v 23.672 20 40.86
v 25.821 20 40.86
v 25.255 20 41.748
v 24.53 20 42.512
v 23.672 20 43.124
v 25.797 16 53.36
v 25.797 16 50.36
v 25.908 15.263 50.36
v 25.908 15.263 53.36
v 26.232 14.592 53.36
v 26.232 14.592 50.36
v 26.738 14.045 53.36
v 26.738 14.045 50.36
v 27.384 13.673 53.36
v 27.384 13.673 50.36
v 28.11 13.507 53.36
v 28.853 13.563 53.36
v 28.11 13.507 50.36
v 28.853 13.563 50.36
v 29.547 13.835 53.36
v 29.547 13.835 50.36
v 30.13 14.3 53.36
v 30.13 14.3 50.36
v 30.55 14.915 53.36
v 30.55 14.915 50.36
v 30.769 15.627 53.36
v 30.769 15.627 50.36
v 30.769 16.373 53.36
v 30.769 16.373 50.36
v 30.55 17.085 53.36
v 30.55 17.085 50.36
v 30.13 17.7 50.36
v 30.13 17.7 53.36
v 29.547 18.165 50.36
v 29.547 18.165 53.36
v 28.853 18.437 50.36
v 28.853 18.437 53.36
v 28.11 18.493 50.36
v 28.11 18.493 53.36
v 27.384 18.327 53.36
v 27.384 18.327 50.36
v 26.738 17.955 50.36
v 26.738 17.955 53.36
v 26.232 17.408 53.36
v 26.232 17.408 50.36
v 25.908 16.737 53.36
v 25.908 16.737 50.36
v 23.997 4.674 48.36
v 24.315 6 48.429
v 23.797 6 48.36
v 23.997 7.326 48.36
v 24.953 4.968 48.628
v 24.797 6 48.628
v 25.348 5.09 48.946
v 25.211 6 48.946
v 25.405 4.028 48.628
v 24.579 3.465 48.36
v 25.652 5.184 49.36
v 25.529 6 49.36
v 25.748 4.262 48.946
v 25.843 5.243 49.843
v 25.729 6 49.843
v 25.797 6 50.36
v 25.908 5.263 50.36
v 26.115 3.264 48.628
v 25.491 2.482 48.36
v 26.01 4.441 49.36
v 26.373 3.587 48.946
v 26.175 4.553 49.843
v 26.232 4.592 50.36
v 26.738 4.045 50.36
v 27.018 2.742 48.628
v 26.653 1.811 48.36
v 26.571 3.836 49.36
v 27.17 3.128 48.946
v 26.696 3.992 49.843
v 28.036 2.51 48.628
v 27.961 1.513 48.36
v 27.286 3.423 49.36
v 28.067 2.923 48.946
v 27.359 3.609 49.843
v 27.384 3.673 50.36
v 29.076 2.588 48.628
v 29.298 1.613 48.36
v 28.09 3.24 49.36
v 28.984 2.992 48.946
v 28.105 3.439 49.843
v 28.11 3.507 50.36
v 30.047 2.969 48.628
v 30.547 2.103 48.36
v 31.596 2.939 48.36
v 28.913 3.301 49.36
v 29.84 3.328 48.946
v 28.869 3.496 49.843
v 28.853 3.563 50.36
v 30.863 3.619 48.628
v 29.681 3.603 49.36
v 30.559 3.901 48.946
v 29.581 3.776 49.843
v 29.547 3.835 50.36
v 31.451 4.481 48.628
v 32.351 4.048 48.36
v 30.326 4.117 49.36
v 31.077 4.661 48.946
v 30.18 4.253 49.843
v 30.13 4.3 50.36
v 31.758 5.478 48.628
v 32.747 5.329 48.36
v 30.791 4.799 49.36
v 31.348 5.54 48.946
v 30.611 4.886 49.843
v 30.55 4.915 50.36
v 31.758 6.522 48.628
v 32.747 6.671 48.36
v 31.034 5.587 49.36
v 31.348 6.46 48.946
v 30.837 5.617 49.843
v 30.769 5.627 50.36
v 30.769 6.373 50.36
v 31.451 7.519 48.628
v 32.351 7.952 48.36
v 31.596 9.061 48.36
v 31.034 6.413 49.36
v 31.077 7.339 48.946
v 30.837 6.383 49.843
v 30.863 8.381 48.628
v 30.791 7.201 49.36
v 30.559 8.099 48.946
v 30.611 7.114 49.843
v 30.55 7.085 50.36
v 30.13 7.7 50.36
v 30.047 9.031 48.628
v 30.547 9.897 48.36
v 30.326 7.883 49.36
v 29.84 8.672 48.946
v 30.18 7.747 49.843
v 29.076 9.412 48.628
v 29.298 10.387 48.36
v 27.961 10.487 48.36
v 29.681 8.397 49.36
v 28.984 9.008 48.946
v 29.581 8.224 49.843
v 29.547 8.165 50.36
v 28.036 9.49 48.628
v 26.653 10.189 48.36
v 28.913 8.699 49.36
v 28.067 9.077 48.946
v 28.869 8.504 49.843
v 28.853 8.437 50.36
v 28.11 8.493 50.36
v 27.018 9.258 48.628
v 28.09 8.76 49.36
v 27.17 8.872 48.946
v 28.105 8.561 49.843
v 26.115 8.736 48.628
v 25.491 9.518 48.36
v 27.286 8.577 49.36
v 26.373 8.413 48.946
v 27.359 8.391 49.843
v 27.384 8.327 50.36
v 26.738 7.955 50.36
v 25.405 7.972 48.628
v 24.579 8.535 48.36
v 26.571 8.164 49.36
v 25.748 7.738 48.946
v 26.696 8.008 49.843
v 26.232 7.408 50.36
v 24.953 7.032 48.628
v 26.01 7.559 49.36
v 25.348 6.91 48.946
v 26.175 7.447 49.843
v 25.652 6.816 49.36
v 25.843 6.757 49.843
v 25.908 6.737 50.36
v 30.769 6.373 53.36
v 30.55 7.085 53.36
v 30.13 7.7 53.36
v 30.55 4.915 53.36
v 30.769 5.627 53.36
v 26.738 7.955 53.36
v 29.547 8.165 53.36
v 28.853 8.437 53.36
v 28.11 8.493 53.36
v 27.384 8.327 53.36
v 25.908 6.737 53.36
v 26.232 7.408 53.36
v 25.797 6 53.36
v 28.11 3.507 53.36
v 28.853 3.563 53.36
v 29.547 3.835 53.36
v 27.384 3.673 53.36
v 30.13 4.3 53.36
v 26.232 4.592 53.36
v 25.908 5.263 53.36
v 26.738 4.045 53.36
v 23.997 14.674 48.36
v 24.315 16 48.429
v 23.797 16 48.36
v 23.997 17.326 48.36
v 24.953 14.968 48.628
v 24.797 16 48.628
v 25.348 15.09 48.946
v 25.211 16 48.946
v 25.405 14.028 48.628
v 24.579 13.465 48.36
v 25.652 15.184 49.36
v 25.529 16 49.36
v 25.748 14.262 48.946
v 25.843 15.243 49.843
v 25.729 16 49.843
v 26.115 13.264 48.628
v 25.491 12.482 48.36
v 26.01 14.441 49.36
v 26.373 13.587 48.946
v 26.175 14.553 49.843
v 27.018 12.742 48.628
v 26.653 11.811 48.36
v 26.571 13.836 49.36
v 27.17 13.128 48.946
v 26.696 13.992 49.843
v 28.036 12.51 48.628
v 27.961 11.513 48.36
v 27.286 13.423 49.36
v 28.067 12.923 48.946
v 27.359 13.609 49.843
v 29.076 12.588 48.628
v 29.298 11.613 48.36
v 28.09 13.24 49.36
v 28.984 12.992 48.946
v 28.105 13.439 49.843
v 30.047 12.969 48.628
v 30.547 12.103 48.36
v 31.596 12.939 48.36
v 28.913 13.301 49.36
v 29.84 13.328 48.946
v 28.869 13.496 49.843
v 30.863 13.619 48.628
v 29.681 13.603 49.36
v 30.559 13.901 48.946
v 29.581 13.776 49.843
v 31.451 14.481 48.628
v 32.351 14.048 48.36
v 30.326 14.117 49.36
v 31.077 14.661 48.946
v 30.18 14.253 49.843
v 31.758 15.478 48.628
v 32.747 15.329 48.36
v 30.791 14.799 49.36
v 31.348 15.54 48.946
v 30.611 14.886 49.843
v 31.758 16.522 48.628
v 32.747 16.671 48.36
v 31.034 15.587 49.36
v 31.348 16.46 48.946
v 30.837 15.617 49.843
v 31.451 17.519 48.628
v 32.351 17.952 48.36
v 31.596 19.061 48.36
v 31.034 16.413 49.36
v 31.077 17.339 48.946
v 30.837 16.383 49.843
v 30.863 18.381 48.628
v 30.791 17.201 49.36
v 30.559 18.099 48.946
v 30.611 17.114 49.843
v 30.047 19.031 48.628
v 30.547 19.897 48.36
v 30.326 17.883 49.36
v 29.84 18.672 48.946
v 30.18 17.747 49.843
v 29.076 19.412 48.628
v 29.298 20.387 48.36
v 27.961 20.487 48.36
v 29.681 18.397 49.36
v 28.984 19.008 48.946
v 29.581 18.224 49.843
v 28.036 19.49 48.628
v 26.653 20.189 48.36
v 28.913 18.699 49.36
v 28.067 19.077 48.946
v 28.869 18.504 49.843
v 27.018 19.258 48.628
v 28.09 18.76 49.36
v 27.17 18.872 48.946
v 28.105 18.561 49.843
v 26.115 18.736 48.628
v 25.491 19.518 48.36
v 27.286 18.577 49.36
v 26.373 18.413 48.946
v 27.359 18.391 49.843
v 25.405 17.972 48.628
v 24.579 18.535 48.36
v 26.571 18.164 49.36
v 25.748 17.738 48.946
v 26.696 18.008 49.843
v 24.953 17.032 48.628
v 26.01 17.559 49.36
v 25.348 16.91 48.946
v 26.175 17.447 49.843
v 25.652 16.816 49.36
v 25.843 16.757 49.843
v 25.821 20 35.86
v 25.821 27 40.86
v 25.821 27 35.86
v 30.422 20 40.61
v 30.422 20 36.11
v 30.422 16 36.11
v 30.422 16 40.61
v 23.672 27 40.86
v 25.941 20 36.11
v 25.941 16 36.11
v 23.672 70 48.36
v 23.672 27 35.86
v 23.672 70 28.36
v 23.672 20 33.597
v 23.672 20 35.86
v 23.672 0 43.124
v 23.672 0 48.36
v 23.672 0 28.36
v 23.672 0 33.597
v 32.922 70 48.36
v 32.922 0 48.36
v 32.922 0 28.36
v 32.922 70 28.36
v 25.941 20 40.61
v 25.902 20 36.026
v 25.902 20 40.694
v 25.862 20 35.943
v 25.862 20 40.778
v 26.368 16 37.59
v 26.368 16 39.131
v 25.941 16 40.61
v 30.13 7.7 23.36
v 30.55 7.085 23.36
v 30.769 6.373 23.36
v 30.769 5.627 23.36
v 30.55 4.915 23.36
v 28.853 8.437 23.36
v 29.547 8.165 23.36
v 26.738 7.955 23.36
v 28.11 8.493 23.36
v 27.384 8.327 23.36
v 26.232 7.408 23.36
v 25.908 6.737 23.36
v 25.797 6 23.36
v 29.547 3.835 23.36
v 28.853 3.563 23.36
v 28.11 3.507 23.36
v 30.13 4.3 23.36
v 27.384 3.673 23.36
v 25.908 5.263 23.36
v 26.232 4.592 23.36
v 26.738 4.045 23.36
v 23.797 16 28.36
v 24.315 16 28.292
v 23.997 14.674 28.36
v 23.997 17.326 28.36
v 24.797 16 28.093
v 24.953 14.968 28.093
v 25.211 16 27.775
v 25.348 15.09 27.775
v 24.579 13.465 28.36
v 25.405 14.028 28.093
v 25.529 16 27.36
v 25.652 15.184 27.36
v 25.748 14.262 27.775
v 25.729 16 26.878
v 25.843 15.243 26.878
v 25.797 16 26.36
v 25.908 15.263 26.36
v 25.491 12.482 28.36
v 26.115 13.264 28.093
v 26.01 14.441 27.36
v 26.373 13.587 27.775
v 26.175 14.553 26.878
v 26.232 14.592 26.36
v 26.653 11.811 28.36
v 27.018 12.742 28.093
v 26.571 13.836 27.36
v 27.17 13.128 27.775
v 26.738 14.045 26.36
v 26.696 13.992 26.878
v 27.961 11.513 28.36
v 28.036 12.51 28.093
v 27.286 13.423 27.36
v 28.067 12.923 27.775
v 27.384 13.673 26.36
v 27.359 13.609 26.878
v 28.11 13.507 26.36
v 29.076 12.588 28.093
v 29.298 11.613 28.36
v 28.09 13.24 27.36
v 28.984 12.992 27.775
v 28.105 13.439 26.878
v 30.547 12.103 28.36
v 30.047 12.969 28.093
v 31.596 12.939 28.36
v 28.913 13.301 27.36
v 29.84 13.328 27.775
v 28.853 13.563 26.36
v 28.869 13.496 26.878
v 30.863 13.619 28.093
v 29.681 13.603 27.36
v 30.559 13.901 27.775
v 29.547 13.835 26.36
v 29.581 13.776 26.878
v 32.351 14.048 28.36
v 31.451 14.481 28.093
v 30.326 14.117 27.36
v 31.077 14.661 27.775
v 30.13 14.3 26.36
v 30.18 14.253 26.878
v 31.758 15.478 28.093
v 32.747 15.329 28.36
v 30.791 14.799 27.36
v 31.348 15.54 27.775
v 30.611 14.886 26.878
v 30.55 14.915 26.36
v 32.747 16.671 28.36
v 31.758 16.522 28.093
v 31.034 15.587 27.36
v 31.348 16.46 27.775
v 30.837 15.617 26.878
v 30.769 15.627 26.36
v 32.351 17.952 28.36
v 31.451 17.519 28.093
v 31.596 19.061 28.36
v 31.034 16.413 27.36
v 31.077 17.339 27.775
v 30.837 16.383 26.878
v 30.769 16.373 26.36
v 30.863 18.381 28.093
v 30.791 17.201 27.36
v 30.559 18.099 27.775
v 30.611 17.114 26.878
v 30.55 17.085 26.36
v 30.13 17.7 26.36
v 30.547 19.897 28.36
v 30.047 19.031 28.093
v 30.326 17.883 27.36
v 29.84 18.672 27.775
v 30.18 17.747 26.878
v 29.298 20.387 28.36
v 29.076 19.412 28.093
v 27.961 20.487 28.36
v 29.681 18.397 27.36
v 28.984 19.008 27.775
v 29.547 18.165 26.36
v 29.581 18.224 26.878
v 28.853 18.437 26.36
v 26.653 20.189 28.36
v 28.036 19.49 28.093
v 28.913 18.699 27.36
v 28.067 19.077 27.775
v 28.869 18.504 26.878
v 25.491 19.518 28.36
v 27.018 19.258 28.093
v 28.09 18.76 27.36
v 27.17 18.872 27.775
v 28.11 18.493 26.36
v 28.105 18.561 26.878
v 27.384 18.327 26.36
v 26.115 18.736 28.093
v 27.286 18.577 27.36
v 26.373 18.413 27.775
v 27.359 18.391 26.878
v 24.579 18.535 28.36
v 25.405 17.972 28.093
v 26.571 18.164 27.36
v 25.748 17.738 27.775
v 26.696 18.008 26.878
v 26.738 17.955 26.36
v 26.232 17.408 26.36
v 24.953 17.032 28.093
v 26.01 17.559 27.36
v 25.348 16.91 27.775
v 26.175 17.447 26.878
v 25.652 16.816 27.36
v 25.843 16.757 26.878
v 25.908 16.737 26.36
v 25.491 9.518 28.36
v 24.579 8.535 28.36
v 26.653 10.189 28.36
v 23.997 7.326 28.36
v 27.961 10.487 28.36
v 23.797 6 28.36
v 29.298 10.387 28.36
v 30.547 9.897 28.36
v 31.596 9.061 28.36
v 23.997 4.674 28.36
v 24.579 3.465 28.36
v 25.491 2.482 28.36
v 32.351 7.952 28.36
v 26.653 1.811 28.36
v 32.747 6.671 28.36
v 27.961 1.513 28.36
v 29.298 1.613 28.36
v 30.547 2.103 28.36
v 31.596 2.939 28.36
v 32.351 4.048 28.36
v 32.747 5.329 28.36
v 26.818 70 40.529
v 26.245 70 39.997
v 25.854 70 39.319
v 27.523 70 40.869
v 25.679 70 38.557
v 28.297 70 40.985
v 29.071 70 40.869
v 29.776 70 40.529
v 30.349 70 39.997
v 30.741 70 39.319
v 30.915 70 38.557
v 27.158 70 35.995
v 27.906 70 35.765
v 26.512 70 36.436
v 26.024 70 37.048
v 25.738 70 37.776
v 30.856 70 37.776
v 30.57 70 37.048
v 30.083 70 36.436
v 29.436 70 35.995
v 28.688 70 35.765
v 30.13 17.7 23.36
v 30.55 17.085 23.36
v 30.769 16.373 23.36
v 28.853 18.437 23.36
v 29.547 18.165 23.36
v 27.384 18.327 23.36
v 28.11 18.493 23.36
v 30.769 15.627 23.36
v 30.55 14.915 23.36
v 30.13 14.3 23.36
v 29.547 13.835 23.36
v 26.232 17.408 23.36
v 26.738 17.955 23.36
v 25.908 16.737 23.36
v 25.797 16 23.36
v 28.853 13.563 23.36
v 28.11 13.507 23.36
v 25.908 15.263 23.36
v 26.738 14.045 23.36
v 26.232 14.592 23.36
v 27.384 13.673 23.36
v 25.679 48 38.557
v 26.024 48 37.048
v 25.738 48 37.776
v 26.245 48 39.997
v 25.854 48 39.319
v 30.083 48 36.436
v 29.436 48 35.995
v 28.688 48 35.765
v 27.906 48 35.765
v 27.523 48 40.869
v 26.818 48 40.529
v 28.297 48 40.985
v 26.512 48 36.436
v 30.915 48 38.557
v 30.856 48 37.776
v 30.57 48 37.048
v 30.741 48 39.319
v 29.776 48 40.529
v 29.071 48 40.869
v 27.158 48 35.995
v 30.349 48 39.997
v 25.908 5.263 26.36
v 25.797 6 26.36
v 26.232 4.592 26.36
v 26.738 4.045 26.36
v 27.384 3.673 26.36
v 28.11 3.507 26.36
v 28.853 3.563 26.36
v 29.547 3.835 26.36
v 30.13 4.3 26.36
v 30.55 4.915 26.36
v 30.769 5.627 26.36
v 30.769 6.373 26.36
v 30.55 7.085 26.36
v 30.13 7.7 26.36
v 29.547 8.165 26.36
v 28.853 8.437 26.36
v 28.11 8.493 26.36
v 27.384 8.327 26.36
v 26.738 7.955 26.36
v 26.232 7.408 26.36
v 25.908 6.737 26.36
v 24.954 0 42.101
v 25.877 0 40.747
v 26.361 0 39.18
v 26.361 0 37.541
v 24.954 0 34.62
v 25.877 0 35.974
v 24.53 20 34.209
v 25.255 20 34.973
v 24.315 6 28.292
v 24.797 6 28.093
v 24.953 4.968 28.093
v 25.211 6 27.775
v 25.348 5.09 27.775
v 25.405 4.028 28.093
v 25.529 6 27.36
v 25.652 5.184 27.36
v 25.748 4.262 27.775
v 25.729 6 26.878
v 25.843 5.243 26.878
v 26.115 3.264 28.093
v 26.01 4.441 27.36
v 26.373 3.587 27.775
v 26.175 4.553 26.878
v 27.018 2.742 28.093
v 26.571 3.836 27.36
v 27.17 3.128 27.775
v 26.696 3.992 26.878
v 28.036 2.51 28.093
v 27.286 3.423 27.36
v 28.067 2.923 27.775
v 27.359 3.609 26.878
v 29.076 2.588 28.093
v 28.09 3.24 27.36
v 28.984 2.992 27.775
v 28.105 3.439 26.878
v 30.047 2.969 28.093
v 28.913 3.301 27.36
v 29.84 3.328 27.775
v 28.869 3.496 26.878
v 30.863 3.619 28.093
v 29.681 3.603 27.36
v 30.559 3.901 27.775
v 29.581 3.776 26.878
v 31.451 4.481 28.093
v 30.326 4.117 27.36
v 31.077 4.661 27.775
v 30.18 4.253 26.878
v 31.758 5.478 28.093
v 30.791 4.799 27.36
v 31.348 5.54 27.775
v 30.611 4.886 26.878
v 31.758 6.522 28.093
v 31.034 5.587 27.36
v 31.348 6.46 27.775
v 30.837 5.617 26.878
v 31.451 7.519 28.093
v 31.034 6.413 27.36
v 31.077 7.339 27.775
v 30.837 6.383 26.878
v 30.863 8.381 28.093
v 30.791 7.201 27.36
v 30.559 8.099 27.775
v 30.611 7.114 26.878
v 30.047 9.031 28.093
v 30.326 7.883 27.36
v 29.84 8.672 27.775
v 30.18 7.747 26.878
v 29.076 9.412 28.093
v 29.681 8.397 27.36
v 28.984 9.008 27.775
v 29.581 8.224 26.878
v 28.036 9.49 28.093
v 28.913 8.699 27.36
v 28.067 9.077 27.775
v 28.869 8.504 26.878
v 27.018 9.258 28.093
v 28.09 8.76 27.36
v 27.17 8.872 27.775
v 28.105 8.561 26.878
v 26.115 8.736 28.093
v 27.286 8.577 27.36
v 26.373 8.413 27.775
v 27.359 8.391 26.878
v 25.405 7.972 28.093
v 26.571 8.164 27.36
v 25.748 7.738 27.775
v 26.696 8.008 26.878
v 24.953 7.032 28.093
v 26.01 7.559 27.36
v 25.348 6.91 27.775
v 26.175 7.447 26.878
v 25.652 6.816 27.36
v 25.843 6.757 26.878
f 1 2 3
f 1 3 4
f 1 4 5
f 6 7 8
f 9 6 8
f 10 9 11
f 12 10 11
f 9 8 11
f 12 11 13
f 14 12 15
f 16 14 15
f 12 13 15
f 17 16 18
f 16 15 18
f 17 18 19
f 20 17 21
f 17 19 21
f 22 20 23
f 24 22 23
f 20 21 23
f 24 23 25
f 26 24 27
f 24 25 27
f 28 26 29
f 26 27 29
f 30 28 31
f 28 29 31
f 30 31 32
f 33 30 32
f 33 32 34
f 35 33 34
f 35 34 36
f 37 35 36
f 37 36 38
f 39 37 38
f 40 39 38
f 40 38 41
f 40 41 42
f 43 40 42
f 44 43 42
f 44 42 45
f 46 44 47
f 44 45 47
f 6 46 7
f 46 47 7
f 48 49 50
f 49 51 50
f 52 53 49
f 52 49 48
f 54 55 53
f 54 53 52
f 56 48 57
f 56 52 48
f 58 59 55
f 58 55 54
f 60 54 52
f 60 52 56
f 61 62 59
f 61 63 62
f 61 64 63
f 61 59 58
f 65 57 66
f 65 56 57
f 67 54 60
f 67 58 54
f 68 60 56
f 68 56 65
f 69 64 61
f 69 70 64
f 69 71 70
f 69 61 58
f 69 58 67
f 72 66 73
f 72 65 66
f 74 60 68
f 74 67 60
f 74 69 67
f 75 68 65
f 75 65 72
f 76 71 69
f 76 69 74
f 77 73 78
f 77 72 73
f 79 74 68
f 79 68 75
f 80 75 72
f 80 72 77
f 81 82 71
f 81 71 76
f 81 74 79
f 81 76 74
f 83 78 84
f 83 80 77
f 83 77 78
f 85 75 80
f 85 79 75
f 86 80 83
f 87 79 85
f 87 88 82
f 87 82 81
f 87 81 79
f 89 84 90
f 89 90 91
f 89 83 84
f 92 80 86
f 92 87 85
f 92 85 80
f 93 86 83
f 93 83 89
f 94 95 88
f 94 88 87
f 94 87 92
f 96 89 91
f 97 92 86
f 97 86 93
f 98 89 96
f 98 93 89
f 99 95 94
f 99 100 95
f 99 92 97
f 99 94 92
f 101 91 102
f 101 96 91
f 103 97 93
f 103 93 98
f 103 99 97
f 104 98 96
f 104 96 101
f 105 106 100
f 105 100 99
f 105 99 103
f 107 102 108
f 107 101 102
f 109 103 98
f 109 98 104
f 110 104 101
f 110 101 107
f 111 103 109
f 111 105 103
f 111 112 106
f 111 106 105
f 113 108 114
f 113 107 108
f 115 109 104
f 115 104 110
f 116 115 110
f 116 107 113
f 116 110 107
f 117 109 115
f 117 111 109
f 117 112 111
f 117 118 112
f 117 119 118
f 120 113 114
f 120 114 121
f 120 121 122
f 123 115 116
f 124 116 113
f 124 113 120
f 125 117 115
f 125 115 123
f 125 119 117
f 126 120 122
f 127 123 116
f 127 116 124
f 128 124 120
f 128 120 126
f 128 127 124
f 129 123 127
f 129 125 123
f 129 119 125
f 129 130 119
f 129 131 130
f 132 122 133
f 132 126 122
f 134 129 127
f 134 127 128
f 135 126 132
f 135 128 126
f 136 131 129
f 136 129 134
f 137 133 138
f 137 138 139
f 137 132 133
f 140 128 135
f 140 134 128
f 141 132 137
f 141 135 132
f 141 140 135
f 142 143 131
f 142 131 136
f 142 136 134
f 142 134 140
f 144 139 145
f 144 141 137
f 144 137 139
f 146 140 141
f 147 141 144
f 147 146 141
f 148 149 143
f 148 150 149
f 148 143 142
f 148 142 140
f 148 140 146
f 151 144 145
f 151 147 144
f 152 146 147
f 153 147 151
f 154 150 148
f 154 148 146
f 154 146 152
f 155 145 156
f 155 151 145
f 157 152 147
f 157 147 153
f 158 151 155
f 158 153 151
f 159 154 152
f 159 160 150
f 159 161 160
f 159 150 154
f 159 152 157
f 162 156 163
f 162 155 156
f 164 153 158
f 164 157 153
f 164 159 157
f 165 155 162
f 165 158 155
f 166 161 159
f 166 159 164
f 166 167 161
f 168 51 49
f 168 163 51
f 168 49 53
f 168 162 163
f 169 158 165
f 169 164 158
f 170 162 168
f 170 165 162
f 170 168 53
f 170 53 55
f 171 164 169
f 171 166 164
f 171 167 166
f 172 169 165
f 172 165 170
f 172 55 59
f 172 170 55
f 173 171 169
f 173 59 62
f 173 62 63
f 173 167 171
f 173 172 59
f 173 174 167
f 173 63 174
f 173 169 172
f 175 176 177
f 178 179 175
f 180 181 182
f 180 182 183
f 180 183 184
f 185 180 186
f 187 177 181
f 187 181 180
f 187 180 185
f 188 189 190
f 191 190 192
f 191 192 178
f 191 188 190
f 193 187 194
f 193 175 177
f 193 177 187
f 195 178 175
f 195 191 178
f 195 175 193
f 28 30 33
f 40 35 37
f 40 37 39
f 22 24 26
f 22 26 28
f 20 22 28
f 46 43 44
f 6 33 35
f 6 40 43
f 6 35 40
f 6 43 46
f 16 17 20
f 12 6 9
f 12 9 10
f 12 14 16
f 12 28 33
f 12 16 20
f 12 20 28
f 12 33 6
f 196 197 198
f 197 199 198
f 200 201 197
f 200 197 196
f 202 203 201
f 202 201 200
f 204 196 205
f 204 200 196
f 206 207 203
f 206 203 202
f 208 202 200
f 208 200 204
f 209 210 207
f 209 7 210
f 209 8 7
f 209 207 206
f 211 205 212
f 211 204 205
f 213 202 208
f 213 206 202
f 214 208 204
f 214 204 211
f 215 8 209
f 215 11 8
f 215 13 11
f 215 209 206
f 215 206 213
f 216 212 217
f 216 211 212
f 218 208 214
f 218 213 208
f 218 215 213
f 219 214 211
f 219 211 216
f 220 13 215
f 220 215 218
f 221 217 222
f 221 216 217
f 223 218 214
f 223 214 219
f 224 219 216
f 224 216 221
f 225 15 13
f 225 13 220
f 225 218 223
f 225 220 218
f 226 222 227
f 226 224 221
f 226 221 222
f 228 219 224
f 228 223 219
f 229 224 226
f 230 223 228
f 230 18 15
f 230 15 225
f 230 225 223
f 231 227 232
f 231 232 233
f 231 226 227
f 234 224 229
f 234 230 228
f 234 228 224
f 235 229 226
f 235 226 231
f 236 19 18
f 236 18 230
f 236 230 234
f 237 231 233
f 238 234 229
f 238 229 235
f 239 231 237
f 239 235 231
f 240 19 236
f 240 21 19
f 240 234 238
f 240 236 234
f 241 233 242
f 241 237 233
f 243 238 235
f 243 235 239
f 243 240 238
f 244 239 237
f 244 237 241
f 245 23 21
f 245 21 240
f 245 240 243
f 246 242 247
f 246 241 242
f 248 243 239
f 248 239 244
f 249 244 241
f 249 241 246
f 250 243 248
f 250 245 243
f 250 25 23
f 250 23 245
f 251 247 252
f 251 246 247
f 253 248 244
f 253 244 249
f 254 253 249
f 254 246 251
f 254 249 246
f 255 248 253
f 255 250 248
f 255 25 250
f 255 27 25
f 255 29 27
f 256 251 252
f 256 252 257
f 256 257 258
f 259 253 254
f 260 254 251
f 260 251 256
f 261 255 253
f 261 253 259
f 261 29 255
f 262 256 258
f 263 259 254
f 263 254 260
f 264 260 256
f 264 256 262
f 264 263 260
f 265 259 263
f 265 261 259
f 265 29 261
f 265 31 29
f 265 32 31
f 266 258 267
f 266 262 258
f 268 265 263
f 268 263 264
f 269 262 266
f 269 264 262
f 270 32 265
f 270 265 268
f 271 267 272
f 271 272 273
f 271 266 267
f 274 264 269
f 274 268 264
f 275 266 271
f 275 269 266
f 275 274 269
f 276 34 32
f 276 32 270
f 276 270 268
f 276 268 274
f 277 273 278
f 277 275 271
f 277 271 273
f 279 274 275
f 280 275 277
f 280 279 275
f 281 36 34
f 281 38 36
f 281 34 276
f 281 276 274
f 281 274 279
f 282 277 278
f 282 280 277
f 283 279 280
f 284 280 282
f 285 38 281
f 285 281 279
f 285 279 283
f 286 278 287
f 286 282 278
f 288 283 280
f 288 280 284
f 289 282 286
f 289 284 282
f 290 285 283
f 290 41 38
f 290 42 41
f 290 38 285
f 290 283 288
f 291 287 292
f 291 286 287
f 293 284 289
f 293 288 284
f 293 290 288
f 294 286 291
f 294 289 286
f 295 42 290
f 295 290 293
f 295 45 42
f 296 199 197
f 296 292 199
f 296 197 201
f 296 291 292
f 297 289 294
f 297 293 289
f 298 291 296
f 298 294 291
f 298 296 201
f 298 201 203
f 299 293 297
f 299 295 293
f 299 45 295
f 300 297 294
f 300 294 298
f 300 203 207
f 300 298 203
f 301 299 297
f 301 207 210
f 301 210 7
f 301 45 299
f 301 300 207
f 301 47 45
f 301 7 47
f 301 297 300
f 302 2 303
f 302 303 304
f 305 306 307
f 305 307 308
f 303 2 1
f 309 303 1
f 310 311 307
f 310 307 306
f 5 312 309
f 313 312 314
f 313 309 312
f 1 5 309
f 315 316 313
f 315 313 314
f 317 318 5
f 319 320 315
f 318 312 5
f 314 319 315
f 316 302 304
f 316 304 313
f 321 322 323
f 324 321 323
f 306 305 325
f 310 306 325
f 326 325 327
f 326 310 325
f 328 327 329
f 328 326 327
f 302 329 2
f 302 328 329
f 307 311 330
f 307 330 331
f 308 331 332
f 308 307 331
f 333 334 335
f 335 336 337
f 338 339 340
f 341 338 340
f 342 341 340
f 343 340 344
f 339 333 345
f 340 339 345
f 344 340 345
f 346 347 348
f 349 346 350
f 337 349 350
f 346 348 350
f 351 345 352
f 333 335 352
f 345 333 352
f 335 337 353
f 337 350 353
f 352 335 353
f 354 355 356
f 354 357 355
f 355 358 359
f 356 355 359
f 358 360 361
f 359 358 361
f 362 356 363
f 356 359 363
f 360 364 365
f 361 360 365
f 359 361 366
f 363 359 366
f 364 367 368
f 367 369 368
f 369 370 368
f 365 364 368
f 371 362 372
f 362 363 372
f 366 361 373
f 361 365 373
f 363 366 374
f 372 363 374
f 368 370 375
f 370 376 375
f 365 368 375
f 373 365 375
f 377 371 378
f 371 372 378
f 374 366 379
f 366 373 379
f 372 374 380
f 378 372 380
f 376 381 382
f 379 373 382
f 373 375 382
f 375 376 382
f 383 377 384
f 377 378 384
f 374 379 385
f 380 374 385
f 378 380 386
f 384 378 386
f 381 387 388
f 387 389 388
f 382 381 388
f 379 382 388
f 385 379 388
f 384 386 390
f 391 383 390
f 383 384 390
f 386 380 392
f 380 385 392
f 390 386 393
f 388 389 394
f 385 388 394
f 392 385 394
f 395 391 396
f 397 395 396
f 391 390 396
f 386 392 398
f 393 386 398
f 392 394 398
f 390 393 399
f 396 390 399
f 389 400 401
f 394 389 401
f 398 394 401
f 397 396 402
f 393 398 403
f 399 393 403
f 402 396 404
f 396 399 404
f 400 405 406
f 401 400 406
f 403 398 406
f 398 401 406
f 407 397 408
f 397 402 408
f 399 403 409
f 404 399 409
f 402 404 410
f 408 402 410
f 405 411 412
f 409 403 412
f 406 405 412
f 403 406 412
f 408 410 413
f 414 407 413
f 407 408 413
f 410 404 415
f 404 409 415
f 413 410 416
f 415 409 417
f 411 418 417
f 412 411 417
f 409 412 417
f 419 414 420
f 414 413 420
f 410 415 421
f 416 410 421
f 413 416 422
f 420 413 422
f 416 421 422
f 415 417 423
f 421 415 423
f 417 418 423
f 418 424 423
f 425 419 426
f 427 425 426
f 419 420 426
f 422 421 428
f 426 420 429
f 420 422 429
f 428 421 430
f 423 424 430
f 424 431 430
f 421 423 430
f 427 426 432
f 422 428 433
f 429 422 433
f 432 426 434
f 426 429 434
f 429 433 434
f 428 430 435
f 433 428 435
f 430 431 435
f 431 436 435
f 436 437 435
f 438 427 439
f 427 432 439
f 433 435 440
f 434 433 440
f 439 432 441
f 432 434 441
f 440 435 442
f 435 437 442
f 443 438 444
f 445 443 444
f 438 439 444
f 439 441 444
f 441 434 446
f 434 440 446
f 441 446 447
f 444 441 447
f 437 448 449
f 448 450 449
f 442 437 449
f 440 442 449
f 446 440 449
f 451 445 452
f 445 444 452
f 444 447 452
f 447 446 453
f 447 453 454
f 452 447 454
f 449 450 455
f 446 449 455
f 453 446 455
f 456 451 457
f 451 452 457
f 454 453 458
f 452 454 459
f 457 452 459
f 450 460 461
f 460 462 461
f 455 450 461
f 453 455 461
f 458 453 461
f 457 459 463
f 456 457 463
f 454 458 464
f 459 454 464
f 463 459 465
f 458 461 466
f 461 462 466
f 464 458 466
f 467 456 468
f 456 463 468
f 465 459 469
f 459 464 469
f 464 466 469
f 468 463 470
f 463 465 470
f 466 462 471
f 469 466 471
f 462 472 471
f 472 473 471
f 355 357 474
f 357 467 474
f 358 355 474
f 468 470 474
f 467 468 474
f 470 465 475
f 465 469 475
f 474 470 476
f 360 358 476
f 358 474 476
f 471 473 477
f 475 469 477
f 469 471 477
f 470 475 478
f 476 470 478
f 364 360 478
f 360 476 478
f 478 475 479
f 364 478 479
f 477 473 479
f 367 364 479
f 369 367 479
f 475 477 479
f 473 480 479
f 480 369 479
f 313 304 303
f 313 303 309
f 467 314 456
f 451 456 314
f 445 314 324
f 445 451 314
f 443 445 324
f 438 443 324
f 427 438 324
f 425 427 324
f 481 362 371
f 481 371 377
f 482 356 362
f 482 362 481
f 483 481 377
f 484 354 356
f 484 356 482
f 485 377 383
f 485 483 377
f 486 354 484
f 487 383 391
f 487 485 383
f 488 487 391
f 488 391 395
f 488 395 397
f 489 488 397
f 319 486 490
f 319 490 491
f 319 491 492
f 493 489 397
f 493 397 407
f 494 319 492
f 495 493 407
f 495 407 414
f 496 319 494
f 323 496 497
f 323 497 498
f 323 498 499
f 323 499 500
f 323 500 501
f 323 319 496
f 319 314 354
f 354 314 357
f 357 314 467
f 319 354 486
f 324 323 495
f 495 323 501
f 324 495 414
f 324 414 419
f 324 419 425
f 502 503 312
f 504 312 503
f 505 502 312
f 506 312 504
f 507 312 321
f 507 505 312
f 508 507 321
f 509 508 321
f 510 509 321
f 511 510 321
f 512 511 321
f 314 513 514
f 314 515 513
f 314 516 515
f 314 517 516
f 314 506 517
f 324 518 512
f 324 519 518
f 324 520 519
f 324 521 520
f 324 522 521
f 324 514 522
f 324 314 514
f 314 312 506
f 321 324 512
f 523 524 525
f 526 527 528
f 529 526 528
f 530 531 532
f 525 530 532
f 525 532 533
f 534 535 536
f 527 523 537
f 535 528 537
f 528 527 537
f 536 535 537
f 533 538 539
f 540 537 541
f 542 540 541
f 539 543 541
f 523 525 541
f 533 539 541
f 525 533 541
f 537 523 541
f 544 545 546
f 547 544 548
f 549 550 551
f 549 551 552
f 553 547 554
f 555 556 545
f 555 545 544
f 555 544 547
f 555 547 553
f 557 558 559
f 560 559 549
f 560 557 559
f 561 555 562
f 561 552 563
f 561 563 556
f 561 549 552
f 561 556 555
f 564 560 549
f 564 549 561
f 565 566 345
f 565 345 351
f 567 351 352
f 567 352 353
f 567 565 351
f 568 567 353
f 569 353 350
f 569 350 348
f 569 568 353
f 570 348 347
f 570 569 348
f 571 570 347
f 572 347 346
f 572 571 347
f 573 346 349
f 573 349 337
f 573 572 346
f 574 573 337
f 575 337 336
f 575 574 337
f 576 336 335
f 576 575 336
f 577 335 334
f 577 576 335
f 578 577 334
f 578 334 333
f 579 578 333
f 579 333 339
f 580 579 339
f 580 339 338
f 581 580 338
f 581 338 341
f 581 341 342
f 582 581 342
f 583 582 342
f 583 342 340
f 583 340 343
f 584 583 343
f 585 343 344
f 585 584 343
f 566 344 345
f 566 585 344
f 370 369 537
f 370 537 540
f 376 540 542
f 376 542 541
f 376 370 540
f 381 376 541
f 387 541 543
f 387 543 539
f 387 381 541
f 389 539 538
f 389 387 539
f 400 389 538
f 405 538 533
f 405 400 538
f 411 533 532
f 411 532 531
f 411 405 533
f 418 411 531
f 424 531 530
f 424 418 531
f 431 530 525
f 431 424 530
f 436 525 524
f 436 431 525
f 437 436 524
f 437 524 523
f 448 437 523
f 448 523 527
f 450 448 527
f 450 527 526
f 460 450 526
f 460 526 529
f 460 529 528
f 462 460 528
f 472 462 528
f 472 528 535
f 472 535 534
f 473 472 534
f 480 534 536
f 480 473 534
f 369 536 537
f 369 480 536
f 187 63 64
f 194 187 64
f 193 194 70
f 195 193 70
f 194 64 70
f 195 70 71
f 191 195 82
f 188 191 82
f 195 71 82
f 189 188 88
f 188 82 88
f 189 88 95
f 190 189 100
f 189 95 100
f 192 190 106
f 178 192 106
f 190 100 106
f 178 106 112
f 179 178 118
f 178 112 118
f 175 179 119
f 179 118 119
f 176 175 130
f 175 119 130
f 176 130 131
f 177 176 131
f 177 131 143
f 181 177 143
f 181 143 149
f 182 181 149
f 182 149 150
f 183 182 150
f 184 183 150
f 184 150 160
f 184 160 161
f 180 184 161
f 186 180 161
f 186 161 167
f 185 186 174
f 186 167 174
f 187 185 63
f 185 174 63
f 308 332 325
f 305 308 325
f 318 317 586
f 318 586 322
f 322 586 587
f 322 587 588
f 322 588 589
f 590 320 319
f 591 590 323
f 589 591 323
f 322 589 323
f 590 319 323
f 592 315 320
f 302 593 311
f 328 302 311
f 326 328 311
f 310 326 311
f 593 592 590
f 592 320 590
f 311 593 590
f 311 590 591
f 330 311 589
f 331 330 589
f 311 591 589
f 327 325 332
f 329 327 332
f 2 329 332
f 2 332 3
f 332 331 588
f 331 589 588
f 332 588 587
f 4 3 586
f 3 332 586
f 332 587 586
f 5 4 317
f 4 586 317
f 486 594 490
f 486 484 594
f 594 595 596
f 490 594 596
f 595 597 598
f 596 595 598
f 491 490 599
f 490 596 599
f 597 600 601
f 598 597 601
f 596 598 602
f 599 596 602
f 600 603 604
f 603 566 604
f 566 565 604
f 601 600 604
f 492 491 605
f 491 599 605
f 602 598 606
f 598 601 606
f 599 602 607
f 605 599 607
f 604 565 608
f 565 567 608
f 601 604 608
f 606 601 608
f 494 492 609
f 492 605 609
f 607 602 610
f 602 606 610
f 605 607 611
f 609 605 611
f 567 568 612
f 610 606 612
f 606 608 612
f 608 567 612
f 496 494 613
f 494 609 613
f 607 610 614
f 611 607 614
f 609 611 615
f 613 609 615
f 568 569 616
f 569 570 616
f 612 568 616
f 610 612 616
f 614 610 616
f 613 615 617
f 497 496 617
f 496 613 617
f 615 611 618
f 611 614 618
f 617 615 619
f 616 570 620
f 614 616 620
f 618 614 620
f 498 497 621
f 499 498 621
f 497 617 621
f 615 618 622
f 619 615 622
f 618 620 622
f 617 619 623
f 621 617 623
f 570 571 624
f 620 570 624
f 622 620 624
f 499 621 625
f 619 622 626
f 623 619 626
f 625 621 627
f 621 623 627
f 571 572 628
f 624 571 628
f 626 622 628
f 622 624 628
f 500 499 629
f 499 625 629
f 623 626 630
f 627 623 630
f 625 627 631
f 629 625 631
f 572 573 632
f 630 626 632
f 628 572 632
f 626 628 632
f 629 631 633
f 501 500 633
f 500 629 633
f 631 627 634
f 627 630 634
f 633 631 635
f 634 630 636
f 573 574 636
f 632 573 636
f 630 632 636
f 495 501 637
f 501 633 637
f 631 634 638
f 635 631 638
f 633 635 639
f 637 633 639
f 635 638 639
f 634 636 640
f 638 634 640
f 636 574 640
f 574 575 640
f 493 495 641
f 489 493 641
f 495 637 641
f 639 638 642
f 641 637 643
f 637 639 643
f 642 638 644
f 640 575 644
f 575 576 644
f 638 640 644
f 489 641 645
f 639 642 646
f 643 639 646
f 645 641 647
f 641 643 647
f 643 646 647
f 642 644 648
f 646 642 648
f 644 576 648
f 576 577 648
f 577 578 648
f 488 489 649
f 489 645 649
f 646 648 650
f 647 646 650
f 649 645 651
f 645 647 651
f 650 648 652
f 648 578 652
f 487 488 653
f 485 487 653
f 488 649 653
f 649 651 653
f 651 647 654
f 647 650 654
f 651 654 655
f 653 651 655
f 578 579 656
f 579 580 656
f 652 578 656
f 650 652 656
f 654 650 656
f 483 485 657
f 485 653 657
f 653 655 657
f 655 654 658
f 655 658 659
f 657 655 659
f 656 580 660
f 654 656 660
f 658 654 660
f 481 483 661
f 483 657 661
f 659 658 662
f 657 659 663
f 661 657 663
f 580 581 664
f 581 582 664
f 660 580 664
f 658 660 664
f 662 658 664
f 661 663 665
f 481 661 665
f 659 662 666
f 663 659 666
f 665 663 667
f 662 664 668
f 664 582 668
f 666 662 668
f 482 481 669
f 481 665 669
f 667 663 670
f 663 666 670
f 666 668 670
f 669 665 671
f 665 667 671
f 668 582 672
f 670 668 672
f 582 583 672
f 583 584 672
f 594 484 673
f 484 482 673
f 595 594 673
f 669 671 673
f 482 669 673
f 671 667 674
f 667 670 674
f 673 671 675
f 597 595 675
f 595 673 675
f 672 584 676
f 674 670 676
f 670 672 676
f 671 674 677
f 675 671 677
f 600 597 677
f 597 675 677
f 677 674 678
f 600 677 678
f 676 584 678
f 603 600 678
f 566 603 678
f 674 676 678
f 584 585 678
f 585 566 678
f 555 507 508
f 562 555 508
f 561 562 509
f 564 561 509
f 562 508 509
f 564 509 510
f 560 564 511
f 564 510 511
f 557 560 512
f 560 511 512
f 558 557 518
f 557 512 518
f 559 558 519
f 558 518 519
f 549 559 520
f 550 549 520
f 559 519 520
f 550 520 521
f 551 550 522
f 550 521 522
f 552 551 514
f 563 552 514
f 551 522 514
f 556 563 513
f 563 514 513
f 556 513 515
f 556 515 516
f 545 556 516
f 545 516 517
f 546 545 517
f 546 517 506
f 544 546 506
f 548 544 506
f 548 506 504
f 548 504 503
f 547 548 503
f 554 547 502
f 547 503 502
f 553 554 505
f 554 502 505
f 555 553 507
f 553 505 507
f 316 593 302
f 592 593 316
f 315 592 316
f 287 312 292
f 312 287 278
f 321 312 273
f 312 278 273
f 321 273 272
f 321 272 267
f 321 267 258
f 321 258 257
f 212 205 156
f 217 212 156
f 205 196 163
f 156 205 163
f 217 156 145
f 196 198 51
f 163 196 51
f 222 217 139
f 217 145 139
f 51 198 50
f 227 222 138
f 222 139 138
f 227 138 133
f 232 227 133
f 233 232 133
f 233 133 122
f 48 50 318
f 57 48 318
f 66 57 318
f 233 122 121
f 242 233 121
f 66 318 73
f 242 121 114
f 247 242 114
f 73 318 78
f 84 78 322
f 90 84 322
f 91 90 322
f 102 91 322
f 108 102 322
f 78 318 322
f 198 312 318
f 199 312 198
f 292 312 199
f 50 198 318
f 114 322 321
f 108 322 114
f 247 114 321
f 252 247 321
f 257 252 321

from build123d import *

# Parameters (mm, degrees)
SKETCH1_W               = 9.25
SKETCH1_H               = 20
BOSS_EXTRUDE1_DEPTH     = 70
SKETCH2_R               = 2.625
CUT_EXTRUDE1_DEPTH      = 22
SKETCH4_R               = 5.5
CUT_EXTRUDE3_DEPTH      = 20
SKETCH5_W               = 2.148979486
SKETCH5_H               = 5
CUT_EXTRUDE4_DEPTH      = 7
CUT_EXTRUDE5_DEPTH      = 86.328689654
CUT_EXTRUDE5_DEPTH_BACK = 4
SKETCH6_W               = 4.5
SKETCH6_H               = 4
SKETCH7_R               = 2.5
BOSS_EXTRUDE2_DEPTH     = 5
FILLET1_R               = 2


with BuildPart() as part:
    # Sketch1 → Boss-Extrude1 (new body)
    with BuildSketch(Plane(origin=(0, 0, 0), x_dir=(1, 0, 0), z_dir=(0, 1, 0))):
        with Locations((28.297124636, -38.360472269)):
            Rectangle(SKETCH1_W, SKETCH1_H)
    extrude(amount=BOSS_EXTRUDE1_DEPTH)

    # Sketch2 → Cut-Extrude1 (cut)
    with BuildSketch(Plane(origin=(0, 70, 0), x_dir=(1, 0, 0), z_dir=(0, 1, 0))):
        with Locations((28.297124636, -38.360472269)):
            Circle(SKETCH2_R)
    extrude(amount=-CUT_EXTRUDE1_DEPTH, mode=Mode.SUBTRACT)

    # Sketch4 → Cut-Extrude3 (cut)
    with BuildSketch(Plane(origin=(0, 0, 0), x_dir=(-1, 0, 0), z_dir=(0, -1, 0))):
        with Locations((-20.922124636, -38.360472269)):
            Circle(SKETCH4_R)
    extrude(amount=-CUT_EXTRUDE3_DEPTH, mode=Mode.SUBTRACT)

    # Sketch5 → Cut-Extrude4 (cut)
    with BuildSketch(Plane(origin=(0, 20, 0), x_dir=(-1, 0, 0), z_dir=(0, -1, 0))):
        with Locations((-24.746614379, -38.360472269)):
            Rectangle(SKETCH5_W, SKETCH5_H)
    extrude(amount=-CUT_EXTRUDE4_DEPTH, mode=Mode.SUBTRACT)

    # Sketch6 → Cut-Extrude5 (cut, two sides: drawn at the far end of the back side and taken through both)
    with BuildSketch(Plane.ZY.offset(-26.422124636).offset(-CUT_EXTRUDE5_DEPTH_BACK)):
        with Locations((38.360472269, 18)):
            Rectangle(SKETCH6_W, SKETCH6_H)
    extrude(amount=CUT_EXTRUDE5_DEPTH + CUT_EXTRUDE5_DEPTH_BACK, mode=Mode.SUBTRACT)

    # Sketch7 → Boss-Extrude2 (add)
    with BuildSketch(Plane.XY.offset(48.360472269)):
        with Locations((28.297124636, 6)):
            Circle(SKETCH7_R)
        with Locations((28.297124636, 16)):
            Circle(SKETCH7_R)
    boss_extrude2 = extrude(amount=BOSS_EXTRUDE2_DEPTH)

    # Mirror1: Boss-Extrude2 across plane
    add(boss_extrude2.mirror(Plane(origin=(0, 0, 38.360472269), x_dir=(1, 0, 0), z_dir=(0, 0, -1))))

    # Fillet1
    fillet1_edges = [part.edges().sort_by_distance(p)[0] for p in [
        (25.797124636, 16, 28.360472269),
        (25.797124636, 6, 28.360472269),
        (25.797124636, 6, 48.360472269),
        (25.797124636, 16, 48.360472269),
    ]]
    fillet(fillet1_edges, radius=FILLET1_R)


solid = part.part
